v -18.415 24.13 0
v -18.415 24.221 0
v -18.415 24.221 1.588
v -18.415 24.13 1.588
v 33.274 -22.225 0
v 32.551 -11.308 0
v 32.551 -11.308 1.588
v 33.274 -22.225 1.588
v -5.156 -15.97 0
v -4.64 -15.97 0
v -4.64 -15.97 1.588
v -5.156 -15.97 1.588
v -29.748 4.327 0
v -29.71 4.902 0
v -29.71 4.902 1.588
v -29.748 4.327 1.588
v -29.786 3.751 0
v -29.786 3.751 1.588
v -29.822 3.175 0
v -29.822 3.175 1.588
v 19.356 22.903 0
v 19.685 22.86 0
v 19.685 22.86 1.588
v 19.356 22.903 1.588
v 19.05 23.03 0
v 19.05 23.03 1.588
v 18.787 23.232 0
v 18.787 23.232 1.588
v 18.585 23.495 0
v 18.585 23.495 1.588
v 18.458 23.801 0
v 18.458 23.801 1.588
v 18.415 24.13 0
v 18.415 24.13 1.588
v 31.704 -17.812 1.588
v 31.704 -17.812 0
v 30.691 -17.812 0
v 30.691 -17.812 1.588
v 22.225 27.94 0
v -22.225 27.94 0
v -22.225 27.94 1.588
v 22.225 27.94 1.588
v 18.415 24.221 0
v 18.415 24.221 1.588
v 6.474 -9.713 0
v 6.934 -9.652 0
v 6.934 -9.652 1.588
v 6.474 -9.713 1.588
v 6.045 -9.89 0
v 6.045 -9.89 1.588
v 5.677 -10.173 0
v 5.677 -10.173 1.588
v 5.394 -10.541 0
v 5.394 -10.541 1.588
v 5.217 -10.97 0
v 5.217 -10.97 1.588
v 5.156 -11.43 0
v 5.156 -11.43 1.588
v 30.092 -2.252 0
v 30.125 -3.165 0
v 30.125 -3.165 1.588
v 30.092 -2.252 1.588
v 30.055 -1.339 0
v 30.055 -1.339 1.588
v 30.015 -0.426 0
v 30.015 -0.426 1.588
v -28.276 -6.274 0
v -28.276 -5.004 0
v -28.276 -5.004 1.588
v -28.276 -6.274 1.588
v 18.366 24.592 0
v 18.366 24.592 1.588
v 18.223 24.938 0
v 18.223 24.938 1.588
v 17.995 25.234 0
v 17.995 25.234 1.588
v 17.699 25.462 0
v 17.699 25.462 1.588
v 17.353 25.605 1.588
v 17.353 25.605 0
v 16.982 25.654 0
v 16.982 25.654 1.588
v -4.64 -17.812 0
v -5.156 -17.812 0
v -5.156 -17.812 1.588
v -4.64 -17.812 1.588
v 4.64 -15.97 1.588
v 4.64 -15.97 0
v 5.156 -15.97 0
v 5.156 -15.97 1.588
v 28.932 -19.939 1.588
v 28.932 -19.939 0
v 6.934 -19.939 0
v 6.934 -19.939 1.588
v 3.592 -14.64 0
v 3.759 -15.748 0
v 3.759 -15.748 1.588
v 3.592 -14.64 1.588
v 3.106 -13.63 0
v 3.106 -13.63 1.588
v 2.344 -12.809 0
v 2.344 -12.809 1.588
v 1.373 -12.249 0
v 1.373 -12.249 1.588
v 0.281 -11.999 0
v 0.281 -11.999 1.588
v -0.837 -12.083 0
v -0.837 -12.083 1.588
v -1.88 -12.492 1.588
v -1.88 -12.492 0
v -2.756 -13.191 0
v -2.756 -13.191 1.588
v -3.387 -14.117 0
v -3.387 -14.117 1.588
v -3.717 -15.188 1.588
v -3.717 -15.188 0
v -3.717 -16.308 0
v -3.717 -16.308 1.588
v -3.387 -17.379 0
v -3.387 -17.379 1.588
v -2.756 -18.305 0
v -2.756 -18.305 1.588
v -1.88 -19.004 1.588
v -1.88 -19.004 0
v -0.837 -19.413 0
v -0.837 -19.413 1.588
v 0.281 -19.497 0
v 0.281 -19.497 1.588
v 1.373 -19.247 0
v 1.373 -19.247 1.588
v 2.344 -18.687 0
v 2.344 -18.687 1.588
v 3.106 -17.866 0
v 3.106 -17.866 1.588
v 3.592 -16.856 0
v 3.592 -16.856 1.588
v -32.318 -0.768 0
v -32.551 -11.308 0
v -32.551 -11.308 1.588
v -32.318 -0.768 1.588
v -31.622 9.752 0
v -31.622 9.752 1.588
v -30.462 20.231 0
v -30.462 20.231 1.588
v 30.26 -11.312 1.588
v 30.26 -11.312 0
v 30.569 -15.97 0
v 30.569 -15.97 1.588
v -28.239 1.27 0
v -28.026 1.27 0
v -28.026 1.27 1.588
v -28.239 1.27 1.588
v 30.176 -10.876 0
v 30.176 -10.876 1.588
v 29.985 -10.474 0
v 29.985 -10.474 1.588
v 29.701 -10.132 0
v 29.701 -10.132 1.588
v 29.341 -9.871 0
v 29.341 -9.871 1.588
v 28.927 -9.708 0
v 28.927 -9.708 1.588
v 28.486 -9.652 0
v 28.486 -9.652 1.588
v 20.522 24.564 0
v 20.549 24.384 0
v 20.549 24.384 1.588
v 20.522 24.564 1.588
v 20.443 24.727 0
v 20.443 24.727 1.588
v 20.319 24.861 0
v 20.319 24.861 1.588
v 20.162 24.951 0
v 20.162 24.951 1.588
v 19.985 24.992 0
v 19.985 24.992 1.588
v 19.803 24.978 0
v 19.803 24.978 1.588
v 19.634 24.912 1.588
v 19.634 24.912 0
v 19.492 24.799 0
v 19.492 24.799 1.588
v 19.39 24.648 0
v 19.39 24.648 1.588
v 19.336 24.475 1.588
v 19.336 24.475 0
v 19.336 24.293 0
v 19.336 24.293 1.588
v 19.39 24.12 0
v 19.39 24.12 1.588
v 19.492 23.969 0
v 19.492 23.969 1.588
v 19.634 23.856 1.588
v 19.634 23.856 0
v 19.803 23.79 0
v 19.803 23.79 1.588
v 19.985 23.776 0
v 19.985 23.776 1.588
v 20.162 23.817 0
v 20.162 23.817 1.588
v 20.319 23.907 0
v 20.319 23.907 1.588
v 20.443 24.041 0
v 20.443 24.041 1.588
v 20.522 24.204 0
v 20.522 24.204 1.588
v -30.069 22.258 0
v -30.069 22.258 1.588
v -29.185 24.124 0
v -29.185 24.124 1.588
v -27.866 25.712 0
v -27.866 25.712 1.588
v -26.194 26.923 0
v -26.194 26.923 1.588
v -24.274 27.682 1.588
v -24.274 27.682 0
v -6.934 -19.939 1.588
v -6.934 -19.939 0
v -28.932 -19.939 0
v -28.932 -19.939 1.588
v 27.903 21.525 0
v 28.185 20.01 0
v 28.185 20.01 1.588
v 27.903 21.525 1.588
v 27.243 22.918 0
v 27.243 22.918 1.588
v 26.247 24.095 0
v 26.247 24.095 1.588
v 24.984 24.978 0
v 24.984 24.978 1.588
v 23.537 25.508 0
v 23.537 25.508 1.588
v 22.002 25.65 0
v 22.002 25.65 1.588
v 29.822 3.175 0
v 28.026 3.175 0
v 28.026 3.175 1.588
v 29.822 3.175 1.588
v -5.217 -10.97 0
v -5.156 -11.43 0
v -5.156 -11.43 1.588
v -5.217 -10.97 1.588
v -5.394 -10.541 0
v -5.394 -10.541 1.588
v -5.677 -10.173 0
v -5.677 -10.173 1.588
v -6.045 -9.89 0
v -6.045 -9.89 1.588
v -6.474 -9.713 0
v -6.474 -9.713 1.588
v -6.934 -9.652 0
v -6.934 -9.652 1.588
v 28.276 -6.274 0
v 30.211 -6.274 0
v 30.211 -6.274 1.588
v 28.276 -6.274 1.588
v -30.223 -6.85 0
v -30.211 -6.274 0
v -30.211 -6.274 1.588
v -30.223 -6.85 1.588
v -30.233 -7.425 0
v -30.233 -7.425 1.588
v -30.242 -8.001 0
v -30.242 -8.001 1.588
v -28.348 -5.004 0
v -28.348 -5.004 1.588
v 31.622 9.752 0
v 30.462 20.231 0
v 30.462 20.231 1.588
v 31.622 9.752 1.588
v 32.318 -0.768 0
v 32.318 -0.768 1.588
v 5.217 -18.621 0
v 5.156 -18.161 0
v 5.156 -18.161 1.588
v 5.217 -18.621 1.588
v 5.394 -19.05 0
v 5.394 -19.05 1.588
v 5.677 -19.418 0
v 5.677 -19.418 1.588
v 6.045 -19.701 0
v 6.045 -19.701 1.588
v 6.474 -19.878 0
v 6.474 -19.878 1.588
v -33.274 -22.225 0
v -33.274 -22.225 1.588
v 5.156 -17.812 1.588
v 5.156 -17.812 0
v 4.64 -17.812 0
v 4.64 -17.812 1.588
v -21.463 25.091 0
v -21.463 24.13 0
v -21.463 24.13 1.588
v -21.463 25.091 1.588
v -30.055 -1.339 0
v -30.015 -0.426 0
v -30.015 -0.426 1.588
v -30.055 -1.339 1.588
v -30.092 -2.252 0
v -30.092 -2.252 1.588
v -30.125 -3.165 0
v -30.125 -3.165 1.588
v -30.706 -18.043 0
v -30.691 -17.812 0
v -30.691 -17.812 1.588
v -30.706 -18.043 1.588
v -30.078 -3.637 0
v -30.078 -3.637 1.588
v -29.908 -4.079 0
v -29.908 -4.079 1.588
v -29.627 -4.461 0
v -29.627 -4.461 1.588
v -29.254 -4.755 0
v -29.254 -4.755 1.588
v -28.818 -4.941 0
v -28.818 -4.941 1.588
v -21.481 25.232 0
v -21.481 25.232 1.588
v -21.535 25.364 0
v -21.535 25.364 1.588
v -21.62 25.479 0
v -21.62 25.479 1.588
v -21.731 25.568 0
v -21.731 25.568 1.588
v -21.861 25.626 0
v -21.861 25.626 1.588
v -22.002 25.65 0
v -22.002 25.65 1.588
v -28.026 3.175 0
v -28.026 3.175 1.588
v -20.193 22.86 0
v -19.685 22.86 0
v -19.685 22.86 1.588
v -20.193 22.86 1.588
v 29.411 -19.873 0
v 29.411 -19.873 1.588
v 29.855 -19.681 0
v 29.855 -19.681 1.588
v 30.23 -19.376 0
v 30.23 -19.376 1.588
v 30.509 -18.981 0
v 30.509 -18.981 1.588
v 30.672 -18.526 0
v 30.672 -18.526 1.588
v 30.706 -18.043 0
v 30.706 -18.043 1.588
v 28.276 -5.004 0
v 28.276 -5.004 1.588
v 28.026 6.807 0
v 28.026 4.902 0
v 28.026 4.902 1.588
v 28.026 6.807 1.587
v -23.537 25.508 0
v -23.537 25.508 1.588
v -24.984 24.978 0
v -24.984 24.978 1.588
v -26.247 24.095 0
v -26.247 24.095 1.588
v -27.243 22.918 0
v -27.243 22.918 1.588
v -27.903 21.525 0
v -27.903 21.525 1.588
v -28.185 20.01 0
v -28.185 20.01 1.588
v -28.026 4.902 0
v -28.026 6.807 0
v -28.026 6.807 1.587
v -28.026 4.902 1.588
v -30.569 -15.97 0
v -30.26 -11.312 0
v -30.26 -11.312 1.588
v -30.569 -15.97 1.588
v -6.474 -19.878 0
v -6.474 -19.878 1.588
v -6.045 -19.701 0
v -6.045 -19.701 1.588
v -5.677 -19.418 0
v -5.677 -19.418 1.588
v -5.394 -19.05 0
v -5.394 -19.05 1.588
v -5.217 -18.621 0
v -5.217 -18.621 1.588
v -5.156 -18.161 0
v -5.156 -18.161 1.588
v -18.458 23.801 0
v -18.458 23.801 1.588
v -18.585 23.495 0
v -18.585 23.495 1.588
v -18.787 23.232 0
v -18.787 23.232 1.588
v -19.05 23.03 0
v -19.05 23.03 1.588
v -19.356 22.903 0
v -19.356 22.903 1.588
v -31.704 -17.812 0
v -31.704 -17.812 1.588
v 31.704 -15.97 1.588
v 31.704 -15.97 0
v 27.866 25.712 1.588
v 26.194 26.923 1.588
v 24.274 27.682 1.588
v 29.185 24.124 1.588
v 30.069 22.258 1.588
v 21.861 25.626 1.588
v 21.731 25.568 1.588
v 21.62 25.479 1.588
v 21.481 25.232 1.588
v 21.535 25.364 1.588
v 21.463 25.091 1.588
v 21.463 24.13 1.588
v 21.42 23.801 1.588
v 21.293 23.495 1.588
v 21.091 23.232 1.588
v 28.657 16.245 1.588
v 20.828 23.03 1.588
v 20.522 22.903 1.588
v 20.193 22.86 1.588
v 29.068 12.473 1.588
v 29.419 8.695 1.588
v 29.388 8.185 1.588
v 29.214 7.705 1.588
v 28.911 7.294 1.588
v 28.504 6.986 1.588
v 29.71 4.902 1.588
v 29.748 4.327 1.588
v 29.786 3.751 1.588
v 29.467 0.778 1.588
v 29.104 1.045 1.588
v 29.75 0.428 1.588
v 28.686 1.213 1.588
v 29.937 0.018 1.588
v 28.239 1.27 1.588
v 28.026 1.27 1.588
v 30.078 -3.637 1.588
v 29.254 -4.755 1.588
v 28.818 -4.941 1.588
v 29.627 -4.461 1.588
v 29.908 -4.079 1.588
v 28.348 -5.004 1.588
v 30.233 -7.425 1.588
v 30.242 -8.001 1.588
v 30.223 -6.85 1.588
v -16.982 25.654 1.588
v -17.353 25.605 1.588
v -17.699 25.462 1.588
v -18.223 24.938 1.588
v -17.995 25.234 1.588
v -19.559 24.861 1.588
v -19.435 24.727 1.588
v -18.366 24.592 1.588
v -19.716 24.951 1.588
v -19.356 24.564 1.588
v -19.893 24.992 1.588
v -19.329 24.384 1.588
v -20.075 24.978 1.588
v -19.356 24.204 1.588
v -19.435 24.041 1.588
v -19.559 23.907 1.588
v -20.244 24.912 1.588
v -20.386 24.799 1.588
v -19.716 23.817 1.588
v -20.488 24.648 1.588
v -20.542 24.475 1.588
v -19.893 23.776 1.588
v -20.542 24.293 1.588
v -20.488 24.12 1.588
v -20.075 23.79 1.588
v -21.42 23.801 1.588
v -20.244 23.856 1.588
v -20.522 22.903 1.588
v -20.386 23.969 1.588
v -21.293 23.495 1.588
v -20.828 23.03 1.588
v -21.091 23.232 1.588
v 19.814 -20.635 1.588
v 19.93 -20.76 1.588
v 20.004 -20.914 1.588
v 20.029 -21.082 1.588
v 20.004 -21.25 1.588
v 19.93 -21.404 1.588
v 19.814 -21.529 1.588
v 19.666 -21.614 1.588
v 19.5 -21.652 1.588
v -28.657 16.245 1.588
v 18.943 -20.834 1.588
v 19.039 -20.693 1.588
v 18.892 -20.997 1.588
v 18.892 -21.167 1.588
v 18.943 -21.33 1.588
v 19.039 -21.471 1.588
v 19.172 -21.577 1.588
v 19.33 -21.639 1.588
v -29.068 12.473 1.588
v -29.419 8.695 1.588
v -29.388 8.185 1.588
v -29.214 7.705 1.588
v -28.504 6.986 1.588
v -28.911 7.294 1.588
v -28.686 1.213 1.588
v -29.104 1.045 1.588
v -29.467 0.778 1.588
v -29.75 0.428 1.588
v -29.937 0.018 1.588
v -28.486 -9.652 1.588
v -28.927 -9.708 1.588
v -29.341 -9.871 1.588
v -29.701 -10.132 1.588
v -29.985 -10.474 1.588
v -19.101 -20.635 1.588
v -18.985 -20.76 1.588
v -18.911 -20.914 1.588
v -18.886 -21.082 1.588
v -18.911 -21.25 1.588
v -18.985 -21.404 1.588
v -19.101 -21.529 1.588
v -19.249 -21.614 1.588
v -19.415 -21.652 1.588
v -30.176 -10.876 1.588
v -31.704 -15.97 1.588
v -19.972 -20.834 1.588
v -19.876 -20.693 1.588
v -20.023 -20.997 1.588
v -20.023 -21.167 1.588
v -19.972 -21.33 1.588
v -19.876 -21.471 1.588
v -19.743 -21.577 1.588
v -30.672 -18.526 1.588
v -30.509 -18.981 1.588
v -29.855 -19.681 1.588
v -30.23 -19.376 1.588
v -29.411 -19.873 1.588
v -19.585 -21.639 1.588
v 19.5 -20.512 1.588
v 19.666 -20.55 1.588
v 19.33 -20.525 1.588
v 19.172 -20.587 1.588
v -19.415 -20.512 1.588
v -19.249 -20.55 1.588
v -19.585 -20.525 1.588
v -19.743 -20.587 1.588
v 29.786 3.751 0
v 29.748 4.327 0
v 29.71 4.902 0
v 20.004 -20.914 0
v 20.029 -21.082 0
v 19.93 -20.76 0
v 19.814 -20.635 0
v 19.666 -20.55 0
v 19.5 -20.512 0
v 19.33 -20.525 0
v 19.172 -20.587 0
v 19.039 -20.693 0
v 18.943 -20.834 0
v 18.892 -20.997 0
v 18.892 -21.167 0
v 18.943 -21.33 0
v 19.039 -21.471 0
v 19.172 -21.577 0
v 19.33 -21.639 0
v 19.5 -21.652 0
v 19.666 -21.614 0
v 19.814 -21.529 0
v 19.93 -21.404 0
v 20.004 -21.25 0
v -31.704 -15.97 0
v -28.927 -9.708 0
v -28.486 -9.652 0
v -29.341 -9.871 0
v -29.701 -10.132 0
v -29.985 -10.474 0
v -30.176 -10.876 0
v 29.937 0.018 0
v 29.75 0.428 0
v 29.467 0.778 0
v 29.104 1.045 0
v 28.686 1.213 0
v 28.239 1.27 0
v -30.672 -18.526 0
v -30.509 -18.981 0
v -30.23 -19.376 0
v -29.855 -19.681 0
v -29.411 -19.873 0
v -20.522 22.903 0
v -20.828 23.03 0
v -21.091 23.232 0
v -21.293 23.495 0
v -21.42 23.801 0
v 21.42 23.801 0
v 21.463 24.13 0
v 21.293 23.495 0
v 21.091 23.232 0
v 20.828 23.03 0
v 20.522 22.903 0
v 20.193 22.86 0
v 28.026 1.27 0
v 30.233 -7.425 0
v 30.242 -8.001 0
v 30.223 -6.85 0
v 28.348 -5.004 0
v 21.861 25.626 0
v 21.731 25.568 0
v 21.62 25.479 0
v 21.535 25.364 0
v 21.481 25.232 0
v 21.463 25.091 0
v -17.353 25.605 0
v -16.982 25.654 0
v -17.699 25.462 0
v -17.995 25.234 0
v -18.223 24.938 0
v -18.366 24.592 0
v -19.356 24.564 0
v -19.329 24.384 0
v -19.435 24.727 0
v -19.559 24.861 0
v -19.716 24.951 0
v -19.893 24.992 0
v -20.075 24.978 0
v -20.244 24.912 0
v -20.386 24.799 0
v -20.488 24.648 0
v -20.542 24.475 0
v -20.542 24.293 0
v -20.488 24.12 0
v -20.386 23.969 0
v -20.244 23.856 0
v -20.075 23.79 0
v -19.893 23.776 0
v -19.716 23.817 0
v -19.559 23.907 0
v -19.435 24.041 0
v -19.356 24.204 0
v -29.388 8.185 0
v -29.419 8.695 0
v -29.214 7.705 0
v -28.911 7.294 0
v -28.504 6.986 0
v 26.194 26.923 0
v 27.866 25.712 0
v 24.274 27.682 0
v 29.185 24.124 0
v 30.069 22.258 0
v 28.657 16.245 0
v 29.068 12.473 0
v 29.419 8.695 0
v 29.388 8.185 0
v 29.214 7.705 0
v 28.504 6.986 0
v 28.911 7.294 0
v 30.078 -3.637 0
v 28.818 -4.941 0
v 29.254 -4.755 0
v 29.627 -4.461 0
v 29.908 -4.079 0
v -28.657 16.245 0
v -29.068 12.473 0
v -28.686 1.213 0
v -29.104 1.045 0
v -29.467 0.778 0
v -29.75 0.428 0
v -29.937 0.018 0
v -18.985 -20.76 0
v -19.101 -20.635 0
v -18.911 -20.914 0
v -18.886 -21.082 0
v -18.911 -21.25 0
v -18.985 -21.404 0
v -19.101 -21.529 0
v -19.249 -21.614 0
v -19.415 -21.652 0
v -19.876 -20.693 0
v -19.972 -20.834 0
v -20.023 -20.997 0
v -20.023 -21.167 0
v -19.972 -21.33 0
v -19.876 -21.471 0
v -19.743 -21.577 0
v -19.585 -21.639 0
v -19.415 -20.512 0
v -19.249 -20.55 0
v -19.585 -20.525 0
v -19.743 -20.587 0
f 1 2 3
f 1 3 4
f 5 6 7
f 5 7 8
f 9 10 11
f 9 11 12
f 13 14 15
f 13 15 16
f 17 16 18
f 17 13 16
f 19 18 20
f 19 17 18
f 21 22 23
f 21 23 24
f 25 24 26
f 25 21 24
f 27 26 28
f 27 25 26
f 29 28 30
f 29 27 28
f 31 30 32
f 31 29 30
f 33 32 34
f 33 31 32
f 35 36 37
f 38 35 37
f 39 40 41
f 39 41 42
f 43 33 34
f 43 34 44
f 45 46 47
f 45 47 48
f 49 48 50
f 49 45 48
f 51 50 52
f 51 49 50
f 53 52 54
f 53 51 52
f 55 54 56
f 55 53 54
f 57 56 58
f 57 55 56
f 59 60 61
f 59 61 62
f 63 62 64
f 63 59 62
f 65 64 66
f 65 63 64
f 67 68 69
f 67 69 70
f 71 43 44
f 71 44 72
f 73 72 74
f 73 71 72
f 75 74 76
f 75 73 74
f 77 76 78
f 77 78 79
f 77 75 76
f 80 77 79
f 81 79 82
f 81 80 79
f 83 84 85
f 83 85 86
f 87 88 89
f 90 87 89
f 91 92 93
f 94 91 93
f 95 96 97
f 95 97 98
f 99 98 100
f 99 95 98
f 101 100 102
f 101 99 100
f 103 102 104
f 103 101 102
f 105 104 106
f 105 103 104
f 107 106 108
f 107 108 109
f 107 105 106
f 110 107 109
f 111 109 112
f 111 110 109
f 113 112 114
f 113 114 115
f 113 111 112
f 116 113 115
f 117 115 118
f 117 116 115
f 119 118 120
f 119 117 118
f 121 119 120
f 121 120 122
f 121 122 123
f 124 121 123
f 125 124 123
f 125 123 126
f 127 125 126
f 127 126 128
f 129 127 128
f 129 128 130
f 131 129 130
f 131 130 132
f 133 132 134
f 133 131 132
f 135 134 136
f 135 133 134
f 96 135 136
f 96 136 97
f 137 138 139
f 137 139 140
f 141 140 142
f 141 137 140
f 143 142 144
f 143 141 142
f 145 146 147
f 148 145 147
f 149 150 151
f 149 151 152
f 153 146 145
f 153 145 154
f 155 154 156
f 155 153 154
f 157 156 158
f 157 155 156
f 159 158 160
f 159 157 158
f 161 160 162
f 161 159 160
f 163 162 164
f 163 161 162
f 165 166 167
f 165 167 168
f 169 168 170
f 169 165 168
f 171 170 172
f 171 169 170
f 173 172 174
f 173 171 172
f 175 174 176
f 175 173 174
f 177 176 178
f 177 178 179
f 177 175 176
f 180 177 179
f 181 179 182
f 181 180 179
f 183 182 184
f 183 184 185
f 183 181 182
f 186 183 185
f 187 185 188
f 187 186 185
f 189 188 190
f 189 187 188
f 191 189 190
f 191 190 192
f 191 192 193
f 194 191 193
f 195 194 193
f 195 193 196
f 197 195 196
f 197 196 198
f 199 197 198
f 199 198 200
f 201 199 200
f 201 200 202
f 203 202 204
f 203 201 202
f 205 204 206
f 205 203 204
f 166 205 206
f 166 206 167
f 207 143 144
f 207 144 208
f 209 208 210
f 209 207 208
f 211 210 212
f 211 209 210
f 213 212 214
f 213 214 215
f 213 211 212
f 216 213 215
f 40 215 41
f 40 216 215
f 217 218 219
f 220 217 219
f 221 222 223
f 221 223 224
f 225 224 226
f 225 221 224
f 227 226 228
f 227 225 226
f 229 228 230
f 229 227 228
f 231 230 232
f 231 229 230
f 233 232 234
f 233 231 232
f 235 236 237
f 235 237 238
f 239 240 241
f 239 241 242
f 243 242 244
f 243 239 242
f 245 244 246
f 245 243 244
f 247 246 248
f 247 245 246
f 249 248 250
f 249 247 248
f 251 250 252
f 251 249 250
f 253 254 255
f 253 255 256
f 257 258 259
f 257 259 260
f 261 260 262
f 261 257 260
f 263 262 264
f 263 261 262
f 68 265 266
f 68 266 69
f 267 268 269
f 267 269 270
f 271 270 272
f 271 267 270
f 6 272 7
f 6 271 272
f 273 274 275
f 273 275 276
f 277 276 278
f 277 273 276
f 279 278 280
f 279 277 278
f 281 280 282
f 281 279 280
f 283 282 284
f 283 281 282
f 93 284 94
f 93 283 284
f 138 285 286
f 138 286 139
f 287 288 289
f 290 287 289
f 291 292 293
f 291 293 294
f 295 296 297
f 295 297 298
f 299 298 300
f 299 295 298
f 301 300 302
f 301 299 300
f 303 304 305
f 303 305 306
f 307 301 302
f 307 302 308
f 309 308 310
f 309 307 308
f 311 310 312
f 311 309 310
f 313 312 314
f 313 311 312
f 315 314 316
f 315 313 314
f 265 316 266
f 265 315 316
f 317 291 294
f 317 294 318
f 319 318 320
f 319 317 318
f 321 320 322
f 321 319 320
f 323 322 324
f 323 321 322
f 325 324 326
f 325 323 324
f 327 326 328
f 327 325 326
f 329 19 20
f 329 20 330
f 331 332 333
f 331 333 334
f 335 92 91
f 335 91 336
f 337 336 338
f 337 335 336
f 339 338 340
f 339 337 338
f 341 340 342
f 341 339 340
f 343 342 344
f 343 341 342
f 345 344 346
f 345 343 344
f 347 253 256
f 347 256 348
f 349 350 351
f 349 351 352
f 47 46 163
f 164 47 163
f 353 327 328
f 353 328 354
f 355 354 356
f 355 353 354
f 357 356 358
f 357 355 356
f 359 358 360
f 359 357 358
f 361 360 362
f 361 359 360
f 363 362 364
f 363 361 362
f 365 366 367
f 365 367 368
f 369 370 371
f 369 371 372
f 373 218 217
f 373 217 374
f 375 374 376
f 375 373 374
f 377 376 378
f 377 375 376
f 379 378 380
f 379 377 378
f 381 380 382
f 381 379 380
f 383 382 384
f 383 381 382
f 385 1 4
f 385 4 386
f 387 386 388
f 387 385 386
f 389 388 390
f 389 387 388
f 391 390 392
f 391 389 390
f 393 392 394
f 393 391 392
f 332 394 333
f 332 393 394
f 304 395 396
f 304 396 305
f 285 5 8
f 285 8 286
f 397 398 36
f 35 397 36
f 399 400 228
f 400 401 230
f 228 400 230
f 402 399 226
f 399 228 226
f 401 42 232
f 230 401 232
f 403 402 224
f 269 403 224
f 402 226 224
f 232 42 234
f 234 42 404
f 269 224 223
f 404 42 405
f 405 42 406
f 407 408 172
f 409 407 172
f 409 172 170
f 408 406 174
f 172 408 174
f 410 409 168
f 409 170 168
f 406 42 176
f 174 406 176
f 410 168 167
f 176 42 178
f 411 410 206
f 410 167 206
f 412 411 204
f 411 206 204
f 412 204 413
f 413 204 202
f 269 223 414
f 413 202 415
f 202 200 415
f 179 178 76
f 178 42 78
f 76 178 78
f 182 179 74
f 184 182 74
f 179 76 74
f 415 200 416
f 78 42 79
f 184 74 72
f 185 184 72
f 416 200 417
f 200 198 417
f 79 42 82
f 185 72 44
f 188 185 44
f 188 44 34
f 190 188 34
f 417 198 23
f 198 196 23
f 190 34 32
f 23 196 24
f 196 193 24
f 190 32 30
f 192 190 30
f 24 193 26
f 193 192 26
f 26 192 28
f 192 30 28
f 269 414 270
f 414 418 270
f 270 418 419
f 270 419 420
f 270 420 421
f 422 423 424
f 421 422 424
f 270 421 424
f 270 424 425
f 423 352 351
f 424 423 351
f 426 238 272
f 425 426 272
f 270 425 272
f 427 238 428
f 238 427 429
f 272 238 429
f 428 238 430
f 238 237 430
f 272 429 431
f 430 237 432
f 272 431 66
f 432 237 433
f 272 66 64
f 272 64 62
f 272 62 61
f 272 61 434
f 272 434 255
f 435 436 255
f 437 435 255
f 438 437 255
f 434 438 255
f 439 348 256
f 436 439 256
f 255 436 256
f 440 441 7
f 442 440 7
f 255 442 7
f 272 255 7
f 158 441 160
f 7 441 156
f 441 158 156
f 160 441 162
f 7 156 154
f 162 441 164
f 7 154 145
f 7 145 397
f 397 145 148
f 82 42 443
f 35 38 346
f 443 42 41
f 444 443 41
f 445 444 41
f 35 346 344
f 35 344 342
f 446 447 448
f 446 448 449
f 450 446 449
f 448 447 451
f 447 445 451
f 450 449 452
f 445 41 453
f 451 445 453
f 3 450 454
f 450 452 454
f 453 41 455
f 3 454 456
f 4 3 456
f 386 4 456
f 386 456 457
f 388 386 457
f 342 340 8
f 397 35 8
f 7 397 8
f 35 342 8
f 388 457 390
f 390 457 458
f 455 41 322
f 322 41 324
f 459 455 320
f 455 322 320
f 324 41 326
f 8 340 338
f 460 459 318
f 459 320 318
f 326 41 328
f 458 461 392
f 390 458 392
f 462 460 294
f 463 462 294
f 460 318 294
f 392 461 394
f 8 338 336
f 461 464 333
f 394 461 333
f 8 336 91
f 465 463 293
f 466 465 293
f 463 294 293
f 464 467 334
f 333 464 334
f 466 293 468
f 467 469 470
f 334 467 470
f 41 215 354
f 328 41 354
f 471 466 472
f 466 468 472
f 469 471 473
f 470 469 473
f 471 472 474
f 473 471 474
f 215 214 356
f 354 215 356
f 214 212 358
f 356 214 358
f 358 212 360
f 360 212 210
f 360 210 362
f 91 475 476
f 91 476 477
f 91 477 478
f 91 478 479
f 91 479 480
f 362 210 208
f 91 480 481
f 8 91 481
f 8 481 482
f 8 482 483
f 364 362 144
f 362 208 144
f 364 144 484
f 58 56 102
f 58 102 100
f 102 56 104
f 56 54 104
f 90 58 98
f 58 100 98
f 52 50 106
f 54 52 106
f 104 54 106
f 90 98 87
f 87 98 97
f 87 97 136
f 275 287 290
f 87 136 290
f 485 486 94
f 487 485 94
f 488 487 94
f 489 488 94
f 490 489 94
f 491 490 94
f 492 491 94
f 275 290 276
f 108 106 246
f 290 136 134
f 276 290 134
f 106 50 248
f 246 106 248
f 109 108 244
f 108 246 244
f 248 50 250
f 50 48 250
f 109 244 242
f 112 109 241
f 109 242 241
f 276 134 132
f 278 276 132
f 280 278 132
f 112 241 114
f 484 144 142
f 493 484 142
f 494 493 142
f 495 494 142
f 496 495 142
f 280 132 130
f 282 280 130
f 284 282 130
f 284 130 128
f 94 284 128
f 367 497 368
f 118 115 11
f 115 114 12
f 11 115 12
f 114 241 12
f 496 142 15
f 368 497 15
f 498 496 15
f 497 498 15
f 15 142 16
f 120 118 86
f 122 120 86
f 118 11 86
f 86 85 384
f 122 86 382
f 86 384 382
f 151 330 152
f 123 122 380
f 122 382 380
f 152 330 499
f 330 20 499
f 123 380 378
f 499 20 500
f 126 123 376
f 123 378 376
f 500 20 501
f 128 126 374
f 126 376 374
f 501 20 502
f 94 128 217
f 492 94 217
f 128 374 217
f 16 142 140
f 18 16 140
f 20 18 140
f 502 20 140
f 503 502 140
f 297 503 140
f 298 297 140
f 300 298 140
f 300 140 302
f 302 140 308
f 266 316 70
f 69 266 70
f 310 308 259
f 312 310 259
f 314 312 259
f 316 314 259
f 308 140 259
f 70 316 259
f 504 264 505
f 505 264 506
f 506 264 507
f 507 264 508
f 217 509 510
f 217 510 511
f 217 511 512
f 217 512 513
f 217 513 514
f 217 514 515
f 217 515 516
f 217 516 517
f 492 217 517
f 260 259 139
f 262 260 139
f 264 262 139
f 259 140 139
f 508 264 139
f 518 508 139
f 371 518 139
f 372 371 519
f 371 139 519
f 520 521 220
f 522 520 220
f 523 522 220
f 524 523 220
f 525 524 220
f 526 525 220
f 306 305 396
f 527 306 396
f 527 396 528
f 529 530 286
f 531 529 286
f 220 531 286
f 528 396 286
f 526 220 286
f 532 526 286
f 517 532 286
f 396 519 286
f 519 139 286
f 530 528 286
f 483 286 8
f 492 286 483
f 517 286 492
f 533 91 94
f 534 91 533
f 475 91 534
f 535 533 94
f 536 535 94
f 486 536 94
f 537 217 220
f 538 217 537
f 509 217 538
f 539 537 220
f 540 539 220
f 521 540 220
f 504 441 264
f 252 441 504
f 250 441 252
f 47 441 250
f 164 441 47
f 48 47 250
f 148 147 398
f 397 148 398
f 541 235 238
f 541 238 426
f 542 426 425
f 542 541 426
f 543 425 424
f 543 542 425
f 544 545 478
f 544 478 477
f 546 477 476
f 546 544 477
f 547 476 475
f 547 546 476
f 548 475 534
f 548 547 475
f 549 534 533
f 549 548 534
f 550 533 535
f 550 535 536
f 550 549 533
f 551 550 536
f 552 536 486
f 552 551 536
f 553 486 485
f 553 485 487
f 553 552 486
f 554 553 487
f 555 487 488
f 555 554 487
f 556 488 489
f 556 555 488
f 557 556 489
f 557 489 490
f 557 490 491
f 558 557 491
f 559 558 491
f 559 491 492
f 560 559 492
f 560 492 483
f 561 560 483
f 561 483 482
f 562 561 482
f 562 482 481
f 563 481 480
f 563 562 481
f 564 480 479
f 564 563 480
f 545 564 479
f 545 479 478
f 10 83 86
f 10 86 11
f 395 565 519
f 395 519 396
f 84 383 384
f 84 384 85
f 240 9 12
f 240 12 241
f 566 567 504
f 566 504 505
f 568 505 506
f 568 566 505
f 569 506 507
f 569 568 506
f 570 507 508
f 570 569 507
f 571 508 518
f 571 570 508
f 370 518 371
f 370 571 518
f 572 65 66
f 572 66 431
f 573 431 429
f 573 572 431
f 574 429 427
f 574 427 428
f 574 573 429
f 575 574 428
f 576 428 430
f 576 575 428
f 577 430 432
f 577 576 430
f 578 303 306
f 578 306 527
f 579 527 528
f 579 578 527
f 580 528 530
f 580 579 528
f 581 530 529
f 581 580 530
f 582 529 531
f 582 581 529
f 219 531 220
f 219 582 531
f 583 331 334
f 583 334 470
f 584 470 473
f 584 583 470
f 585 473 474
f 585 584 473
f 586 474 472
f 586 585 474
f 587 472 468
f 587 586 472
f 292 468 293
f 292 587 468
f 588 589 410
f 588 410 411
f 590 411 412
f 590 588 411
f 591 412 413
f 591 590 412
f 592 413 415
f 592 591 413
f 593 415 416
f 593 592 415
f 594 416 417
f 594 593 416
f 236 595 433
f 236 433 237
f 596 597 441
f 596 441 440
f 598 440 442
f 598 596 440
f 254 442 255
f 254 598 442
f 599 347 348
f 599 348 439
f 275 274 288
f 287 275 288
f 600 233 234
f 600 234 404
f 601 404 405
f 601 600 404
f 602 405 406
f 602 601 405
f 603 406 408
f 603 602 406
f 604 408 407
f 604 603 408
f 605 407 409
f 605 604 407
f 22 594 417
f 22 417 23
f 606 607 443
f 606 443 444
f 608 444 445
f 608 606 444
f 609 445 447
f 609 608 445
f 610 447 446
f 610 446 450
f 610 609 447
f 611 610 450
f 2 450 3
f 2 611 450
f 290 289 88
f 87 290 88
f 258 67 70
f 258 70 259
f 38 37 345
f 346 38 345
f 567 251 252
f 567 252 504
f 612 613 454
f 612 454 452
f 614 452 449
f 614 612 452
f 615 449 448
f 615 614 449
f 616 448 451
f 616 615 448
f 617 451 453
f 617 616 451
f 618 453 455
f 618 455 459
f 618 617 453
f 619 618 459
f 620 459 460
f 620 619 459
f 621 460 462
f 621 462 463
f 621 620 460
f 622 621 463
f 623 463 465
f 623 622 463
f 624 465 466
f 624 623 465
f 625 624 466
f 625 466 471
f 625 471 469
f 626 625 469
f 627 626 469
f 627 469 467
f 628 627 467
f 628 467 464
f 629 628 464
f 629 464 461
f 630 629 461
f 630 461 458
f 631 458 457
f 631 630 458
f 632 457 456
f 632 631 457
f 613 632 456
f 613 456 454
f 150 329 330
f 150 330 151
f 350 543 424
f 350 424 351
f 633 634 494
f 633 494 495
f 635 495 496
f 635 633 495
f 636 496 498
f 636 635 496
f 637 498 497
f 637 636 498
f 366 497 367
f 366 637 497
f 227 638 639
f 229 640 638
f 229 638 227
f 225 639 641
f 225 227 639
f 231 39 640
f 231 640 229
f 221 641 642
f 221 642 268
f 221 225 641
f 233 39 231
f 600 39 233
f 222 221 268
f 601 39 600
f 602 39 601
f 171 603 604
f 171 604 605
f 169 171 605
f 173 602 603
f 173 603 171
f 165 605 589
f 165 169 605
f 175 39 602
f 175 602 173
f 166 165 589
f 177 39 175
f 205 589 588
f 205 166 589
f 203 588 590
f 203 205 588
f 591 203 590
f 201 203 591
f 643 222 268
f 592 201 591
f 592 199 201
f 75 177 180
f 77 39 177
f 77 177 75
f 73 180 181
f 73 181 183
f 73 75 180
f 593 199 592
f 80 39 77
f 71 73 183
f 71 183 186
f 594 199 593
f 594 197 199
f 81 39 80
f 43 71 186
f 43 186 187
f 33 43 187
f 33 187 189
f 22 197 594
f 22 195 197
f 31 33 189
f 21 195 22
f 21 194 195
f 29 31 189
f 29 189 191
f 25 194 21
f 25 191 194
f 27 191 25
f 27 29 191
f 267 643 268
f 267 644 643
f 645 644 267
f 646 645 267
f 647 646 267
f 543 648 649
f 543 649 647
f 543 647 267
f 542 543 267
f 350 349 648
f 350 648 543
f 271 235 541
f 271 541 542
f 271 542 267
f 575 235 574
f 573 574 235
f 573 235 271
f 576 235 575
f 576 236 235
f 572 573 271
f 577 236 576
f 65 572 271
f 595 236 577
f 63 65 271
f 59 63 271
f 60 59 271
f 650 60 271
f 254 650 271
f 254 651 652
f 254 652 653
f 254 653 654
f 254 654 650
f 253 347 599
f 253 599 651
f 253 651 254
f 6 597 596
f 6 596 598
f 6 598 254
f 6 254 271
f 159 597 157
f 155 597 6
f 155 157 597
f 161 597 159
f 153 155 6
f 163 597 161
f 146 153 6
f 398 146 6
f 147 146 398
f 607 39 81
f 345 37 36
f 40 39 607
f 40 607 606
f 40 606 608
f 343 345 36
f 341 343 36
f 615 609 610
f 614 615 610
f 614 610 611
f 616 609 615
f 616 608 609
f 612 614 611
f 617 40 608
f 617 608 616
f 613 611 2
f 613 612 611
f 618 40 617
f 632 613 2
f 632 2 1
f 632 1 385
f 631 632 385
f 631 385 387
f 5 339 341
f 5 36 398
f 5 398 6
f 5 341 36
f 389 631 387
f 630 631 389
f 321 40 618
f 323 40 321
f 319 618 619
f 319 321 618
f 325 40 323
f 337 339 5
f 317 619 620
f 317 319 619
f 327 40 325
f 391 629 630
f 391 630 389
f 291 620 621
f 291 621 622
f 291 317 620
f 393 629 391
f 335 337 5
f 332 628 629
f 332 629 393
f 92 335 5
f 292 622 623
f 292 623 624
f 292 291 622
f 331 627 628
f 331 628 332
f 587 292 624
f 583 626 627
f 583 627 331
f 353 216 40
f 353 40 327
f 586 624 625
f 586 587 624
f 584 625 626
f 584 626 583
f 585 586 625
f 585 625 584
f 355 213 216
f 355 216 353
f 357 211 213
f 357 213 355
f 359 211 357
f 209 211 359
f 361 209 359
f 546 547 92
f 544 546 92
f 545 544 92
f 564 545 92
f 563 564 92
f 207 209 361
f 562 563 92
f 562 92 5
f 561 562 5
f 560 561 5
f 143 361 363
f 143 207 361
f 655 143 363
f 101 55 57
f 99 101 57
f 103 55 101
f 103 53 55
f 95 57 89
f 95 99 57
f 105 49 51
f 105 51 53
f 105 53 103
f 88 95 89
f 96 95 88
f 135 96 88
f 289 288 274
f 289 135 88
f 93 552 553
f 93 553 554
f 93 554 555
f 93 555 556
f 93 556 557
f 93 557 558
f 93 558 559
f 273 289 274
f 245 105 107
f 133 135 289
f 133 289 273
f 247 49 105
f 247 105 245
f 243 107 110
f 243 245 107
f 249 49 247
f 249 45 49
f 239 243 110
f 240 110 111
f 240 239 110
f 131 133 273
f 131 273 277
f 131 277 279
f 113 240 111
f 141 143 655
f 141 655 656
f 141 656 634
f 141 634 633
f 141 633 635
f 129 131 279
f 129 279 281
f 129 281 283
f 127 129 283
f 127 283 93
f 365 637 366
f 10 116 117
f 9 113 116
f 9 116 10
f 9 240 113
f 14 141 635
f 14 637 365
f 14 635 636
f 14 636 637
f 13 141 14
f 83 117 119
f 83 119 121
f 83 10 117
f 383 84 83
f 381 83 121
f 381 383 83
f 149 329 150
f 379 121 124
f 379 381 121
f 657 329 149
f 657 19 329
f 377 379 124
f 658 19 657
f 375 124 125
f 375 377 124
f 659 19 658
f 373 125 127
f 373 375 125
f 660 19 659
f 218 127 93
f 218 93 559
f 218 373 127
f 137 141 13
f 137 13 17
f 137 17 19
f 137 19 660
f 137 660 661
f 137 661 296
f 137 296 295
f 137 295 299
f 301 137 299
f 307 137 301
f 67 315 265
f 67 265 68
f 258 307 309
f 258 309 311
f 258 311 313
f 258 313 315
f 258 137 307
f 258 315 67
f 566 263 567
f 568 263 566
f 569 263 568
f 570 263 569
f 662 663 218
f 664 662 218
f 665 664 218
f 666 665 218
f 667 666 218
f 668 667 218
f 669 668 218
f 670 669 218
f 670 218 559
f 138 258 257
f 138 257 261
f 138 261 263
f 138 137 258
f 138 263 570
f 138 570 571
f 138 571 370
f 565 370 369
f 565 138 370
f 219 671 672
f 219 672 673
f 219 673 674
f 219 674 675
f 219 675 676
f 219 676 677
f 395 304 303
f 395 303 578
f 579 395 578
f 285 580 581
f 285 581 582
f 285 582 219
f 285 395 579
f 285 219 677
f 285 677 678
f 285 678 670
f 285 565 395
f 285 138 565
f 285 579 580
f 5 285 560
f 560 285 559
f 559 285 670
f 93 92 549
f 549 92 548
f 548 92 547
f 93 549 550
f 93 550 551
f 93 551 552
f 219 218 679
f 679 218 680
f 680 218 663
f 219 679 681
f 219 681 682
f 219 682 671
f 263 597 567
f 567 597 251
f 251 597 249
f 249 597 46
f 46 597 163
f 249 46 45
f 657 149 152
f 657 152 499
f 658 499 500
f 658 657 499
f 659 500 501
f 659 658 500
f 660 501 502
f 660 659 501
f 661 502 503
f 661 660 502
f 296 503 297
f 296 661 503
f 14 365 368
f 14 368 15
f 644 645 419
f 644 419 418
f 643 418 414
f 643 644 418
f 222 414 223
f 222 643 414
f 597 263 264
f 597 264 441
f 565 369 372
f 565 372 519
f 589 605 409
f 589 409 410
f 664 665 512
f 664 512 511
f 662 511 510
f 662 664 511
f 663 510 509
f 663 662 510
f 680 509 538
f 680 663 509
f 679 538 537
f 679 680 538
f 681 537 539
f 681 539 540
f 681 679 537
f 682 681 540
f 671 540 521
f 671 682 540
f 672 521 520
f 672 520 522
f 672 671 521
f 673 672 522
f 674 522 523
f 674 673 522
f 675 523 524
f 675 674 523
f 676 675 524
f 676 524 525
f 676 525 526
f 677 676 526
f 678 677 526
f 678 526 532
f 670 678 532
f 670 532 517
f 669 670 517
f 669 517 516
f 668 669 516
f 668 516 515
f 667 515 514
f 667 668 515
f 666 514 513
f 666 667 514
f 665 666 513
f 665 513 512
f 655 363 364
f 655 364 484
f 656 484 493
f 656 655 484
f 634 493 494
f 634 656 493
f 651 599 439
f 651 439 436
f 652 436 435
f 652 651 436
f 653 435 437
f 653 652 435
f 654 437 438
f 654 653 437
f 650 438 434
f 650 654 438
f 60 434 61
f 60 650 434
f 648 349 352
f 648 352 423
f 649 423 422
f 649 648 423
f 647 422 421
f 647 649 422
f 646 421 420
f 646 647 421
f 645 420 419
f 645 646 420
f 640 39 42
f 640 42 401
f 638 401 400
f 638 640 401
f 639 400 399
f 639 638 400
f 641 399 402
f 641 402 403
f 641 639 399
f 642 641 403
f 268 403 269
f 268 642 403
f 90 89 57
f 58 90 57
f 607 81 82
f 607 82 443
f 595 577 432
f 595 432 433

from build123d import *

# Parameters (mm, degrees)
SKETCH1_R           = 3.7592
SKETCH1_R_2         = 0.5715
SKETCH1_R_3         = 0.6096
BOSS_EXTRUDE1_DEPTH = 1.5875
FILLET1_R           = 1.778


with BuildPart() as part:
    # Sketch1 → Boss-Extrude1 (new body)
    with BuildSketch(Plane.XY):
        with BuildLine():
            Line((32.550881113, -11.307538914), (33.274, -22.225))
            Line((33.274, -22.225), (-33.274, -22.225))
            Line((-33.274, -22.225), (-32.550881113, -11.307538914))
            ThreePointArc((-32.550881113, -11.307538914), (-32.028077235, 4.496070358), (-30.461951667, 20.230575137))
            ThreePointArc((-30.461951667, 20.230575137), (-27.865979624, 25.711970539), (-22.225, 27.94))
            Line((-22.225, 27.94), (22.225, 27.94))
            ThreePointArc((22.225, 27.94), (27.865979624, 25.711970539), (30.461951667, 20.230575137))
            ThreePointArc((30.461951667, 20.230575137), (32.028077235, 4.496070358), (32.550881113, -11.307538914))
        make_face()
        with Locations((0, -15.748)):
            Circle(SKETCH1_R, mode=Mode.SUBTRACT)
        with Locations((19.457528855, -21.082)):
            Circle(SKETCH1_R_2, mode=Mode.SUBTRACT)
        with Locations((-19.939, 24.384)):
            Circle(SKETCH1_R_3, mode=Mode.SUBTRACT)
        with Locations((19.939, 24.384)):
            Circle(SKETCH1_R_3, mode=Mode.SUBTRACT)
        with Locations((-19.457528855, -21.082)):
            Circle(SKETCH1_R_2, mode=Mode.SUBTRACT)
        with BuildLine():
            Line((16.982329273, 25.654), (-16.982329273, 25.654))
            ThreePointArc((-16.982329273, 25.654), (-17.995380459, 25.234380459), (-18.415, 24.221329273))
            Line((-18.415, 24.221329273), (-18.415, 24.13))
            ThreePointArc((-18.415, 24.13), (-18.786974388, 23.231974388), (-19.685, 22.86))
            Line((-19.685, 22.86), (-20.193, 22.86))
            ThreePointArc((-20.193, 22.86), (-21.091025612, 23.231974388), (-21.463, 24.13))
            Line((-21.463, 24.13), (-21.463, 25.09062388))
            ThreePointArc((-21.463, 25.09062388), (-21.619564426, 25.478838601), (-22.001648865, 25.649819802))
            ThreePointArc((-22.001648865, 25.649819802), (-26.24741448, 24.095118224), (-28.185149732, 20.00992487))
            ThreePointArc((-28.185149732, 20.00992487), (-28.97064802, 13.418275107), (-29.571097928, 6.8072))
            Line((-29.571097928, 6.8072), (-28.02566998, 6.8072))
            Line((-28.02566998, 6.8072), (-28.02566998, 4.9022))
            Line((-28.02566998, 4.9022), (-29.709508346, 4.9022))
            ThreePointArc((-29.709508346, 4.9022), (-29.767162744, 4.038702455), (-29.821661459, 3.175))
            Line((-29.821661459, 3.175), (-28.02566998, 3.175))
            Line((-28.02566998, 3.175), (-28.02566998, 1.27))
            Line((-28.02566998, 1.27), (-29.93066998, 1.27))
            ThreePointArc((-29.93066998, 1.27), (-30.076613863, -1.86607048), (-30.180974457, -5.0038))
            Line((-30.180974457, -5.0038), (-28.275974457, -5.0038))
            Line((-28.275974457, -5.0038), (-28.275974457, -6.2738))
            Line((-28.275974457, -6.2738), (-30.211381152, -6.2738))
            ThreePointArc((-30.211381152, -6.2738), (-30.228164423, -7.137372267), (-30.241798154, -8.001))
            Line((-30.241798154, -8.001), (30.241798154, -8.001))
            ThreePointArc((30.241798154, -8.001), (30.228164423, -7.137372267), (30.211381152, -6.2738))
            Line((30.211381152, -6.2738), (28.275974457, -6.2738))
            Line((28.275974457, -6.2738), (28.275974457, -5.0038))
            Line((28.275974457, -5.0038), (30.180974457, -5.0038))
            ThreePointArc((30.180974457, -5.0038), (30.076613863, -1.86607048), (29.93066998, 1.27))
            Line((29.93066998, 1.27), (28.02566998, 1.27))
            Line((28.02566998, 1.27), (28.02566998, 3.175))
            Line((28.02566998, 3.175), (29.821661459, 3.175))
            ThreePointArc((29.821661459, 3.175), (29.767162744, 4.038702455), (29.709508346, 4.9022))
            Line((29.709508346, 4.9022), (28.02566998, 4.9022))
            Line((28.02566998, 4.9022), (28.02566998, 6.8072))
            Line((28.02566998, 6.8072), (29.571097928, 6.8072))
            ThreePointArc((29.571097928, 6.8072), (28.97064802, 13.418275107), (28.185149732, 20.00992487))
            ThreePointArc((28.185149732, 20.00992487), (26.24741448, 24.095118224), (22.001648865, 25.649819802))
            ThreePointArc((22.001648865, 25.649819802), (21.619564426, 25.478838601), (21.463, 25.09062388))
            Line((21.463, 25.09062388), (21.463, 24.13))
            ThreePointArc((21.463, 24.13), (21.091025612, 23.231974388), (20.193, 22.86))
            Line((20.193, 22.86), (19.685, 22.86))
            ThreePointArc((19.685, 22.86), (18.786974388, 23.231974388), (18.415, 24.13))
            Line((18.415, 24.13), (18.415, 24.221329273))
            ThreePointArc((18.415, 24.221329273), (17.995380459, 25.234380459), (16.982329273, 25.654))
        make_face(mode=Mode.SUBTRACT)
        Polygon((30.150217413, -9.652), (30.568707194, -15.97025), (30.330164629, -15.97025), (31.704083289, -15.97025), (31.704083289, -17.81175), (30.690679091, -17.81175), (30.83157766, -19.939), (19.965528855, -19.939), (18.949528855, -19.939), (5.1562, -19.939), (5.1562, -17.81175), (4.640078489, -17.81175), (4.640078489, -15.97025), (5.1562, -15.97025), (5.1562, -9.652), align=None, mode=Mode.SUBTRACT)
        Polygon((-30.83157766, -19.939), (-19.965528855, -19.939), (-18.949528855, -19.939), (-5.1562, -19.939), (-5.1562, -17.81175), (-4.640078489, -17.81175), (-4.640078489, -15.97025), (-5.1562, -15.97025), (-5.1562, -9.652), (-30.150217413, -9.652), (-30.568707194, -15.97025), (-31.704083289, -15.97025), (-31.704083289, -17.81175), (-30.690679091, -17.81175), align=None, mode=Mode.SUBTRACT)
    extrude(amount=BOSS_EXTRUDE1_DEPTH)

    # Fillet1
    # the kernel refuses this fillet: 1.778 mm, written as the material it adds along each edge
    with BuildSketch(Plane(origin=(-30.180974457, -5.0038, 0), x_dir=(1, 0, 0), z_dir=(0, 0, 1))) as fillet1_piece_1:
        with BuildLine():
            CenterArc((1.833067409, 1.778), FILLET1_R, 178.029670908, 91.970329092)
            Line((0.056118624, 1.839131111), (0.020579648, 1.840353734))
            ThreePointArc((0.020579648, 1.840353734), (-0.009270189, 0.920704615), (-0.035547402, 0.000946483))
            Line((-0.035547402, 0.000946483), (0, -0.03556))
            Line((0, -0.03556), (1.833067409, -0.03556))
            Line((1.833067409, -0.03556), (1.833067409, 0))
        make_face()
    extrude(amount=1.5875)
    with BuildSketch(Plane(origin=(-29.93066998, 1.27, 0), x_dir=(-0.04952574354141493, -0.9987728474115973, 0), z_dir=(0, 0, 1))) as fillet1_piece_2:
        with BuildLine():
            CenterArc((1.692020161, 1.777988571), FILLET1_R, 182.838777382, 87.366662802)
            Line((-0.083797962, 1.689931798), (-0.119314324, 1.688170663))
            Line((-0.119314324, 1.688170663), (-0.035516362, -0.001761135))
            Line((-0.035516362, -0.001761135), (-0.000127504, -0.035559771))
            ThreePointArc((-0.000127504, -0.035559771), (0.849197679, -0.037082446), (1.698522862, -0.035559771))
            Line((1.698522862, -0.035559771), (1.698395358, 0))
        make_face()
    extrude(amount=1.5875)
    with BuildSketch(Plane(origin=(-29.571097928, 6.8072, 0), x_dir=(1, 0, 0), z_dir=(0, 0, 1))) as fillet1_piece_3:
        with BuildLine():
            CenterArc((1.924023206, 1.737224692), FILLET1_R, 175.155271265, 82.550426931)
            Line((0.152375588, 1.887387004), (0.116942636, 1.89039025))
            ThreePointArc((0.116942636, 1.89039025), (0.038856877, 0.946707362), (-0.035455831, 0.002719862))
            Line((-0.035455831, 0.002719862), (0, -0.03556))
            ThreePointArc((0, -0.03556), (0.772713974, -0.03556), (1.537856043, -0.034744494))
            Line((1.537856043, -0.034744494), (1.545427948, 0))
        make_face()
    extrude(amount=1.5875)
    with BuildSketch(Plane(origin=(29.93066998, 1.27, 0), x_dir=(0.04952574354144595, -0.9987728474115959, 0), z_dir=(0, 0, 1))) as fillet1_piece_4:
        with BuildLine():
            CenterArc((1.692020161, -1.777988571), FILLET1_R, 89.794559817, 87.366662802)
            Line((-0.083797962, -1.689931798), (-0.119314324, -1.688170663))
            Line((-0.119314324, -1.688170663), (-0.035516362, 0.001761135))
            Line((-0.035516362, 0.001761135), (-0.000127504, 0.035559771))
            ThreePointArc((-0.000127504, 0.035559771), (0.849197679, 0.037082446), (1.698522862, 0.035559771))
            Line((1.698522862, 0.035559771), (1.698395358, 0))
        make_face()
    extrude(amount=1.5875)
    with BuildSketch(Plane(origin=(29.571097928, 6.8072, 0), x_dir=(-0.08047179326546709, 0.9967568863512506, 0), z_dir=(0, 0, 1))) as fillet1_piece_5:
        with BuildLine():
            CenterArc((1.886420273, 1.777985793), FILLET1_R, 187.678616869, 82.550426931)
            Line((0.124363358, 1.540415949), (0.08912222, 1.535664552))
            ThreePointArc((0.08912222, 1.535664552), (0.026737004, 0.773069552), (-0.035444675, 0.002861577))
            Line((-0.035444675, 0.002861577), (-0.000142153, -0.035559716))
            ThreePointArc((-0.000142153, -0.035559716), (0.946763965, -0.037452379), (1.893670084, -0.035559716))
            Line((1.893670084, -0.035559716), (1.89352793, 0))
        make_face()
    extrude(amount=1.5875)
    with BuildSketch(Plane(origin=(30.180974457, -5.0038, 0), x_dir=(-0.03049946566100157, 0.9995347830838072, 0), z_dir=(0, 0, 1))) as fillet1_piece_6:
        with BuildLine():
            CenterArc((1.833080421, 1.777986585), FILLET1_R, 178.252238302, 91.970329092)
            Line((0.055907577, 1.832214635), (0.02036412, 1.833299196))
            Line((0.02036412, 1.833299196), (-0.035543457, 0.001084561))
            Line((-0.035543457, 0.001084561), (-0.000138134, -0.035559732))
            ThreePointArc((-0.000138134, -0.035559732), (0.919993552, -0.037346875), (1.840125238, -0.035559732))
            Line((1.840125238, -0.035559732), (1.839987105, 0))
        make_face()
    extrude(amount=1.5875)
    with BuildSketch(Plane(origin=(-30.150217413, -9.652, 0), x_dir=(-0.06609026487531962, -0.9978136483776467, 0), z_dir=(0, 0, 1))) as fillet1_piece_7:
        with BuildLine():
            CenterArc((FILLET1_R * 0.935956064184, FILLET1_R), FILLET1_R, 183.789455341, 86.210544659)
            Line((-FILLET1_R * 0.0618575841936, FILLET1_R * 0.933909735125), (-FILLET1_R * 0.0818138571611, FILLET1_R * 0.932587929827))
            Line((-FILLET1_R * 0.0818138571611, FILLET1_R * 0.932587929827), (-FILLET1_R * 0.0187191212837, -FILLET1_R * 0.02))
            Line((-FILLET1_R * 0.0187191212837, -FILLET1_R * 0.02), (FILLET1_R * 0.935956064184, -FILLET1_R * 0.02))
            Line((FILLET1_R * 0.935956064184, -FILLET1_R * 0.02), (FILLET1_R * 0.935956064184, 0))
        make_face()
    extrude(amount=1.5875)
    with BuildSketch(Plane(origin=(-5.1562, -9.652, 0), x_dir=(-1, 0, 0), z_dir=(0, 0, 1)), Plane(origin=(5.1562, -9.652, 0), x_dir=(0, -1, 0), z_dir=(0, 0, 1)), Plane(origin=(-5.1562, -19.939, 0), x_dir=(0, 1, 0), z_dir=(0, 0, 1)), Plane(origin=(5.1562, -19.939, 0), x_dir=(1, 0, 0), z_dir=(0, 0, 1))) as fillet1_piece_8:
        with BuildLine():
            CenterArc((FILLET1_R, FILLET1_R), FILLET1_R, 180, 90)
            Line((0, FILLET1_R), (-FILLET1_R * 0.02, FILLET1_R))
            Line((-FILLET1_R * 0.02, FILLET1_R), (-FILLET1_R * 0.02, -FILLET1_R * 0.02))
            Line((-FILLET1_R * 0.02, -FILLET1_R * 0.02), (FILLET1_R, -FILLET1_R * 0.02))
            Line((FILLET1_R, -FILLET1_R * 0.02), (FILLET1_R, 0))
        make_face()
    extrude(amount=1.5875)
    with BuildSketch(Plane(origin=(30.150217413, -9.652, 0), x_dir=(0.06609026487531962, -0.9978136483776467, 0), z_dir=(0, 0, 1))) as fillet1_piece_9:
        with BuildLine():
            CenterArc((FILLET1_R * 0.935956064184, -FILLET1_R), FILLET1_R, 90, 86.210544659)
            Line((-FILLET1_R * 0.0618575841936, -FILLET1_R * 0.933909735125), (-FILLET1_R * 0.0818138571611, -FILLET1_R * 0.932587929827))
            Line((-FILLET1_R * 0.0818138571611, -FILLET1_R * 0.932587929827), (-FILLET1_R * 0.0187191212837, FILLET1_R * 0.02))
            Line((-FILLET1_R * 0.0187191212837, FILLET1_R * 0.02), (FILLET1_R * 0.935956064184, FILLET1_R * 0.02))
            Line((FILLET1_R * 0.935956064184, FILLET1_R * 0.02), (FILLET1_R * 0.935956064184, 0))
        make_face()
    extrude(amount=1.5875)
    with BuildSketch(Plane(origin=(-30.83157766, -19.939, 0), x_dir=(0.06609026487531591, 0.9978136483776471, 0), z_dir=(0, 0, 1))) as fillet1_piece_10:
        with BuildLine():
            CenterArc((FILLET1_R * 1.06842622028, -FILLET1_R), FILLET1_R, 90, 93.789455341)
            Line((FILLET1_R * 0.0706125718977, -FILLET1_R * 1.06609026488), (FILLET1_R * 0.0506562989302, -FILLET1_R * 1.06741207017))
            Line((FILLET1_R * 0.0506562989302, -FILLET1_R * 1.06741207017), (-FILLET1_R * 0.0213685244055, FILLET1_R * 0.02))
            Line((-FILLET1_R * 0.0213685244055, FILLET1_R * 0.02), (FILLET1_R * 1.06842622028, FILLET1_R * 0.02))
            Line((FILLET1_R * 1.06842622028, FILLET1_R * 0.02), (FILLET1_R * 1.06842622028, 0))
        make_face()
    extrude(amount=1.5875)
    with BuildSketch(Plane(origin=(30.83157766, -19.939, 0), x_dir=(-0.06609026487531046, 0.9978136483776474, 0), z_dir=(0, 0, 1))) as fillet1_piece_11:
        with BuildLine():
            CenterArc((FILLET1_R * 1.06842622028, FILLET1_R), FILLET1_R, 176.210544659, 93.789455341)
            Line((FILLET1_R * 0.0706125718977, FILLET1_R * 1.06609026488), (FILLET1_R * 0.0506562989302, FILLET1_R * 1.06741207017))
            Line((FILLET1_R * 0.0506562989302, FILLET1_R * 1.06741207017), (-FILLET1_R * 0.0213685244055, -FILLET1_R * 0.02))
            Line((-FILLET1_R * 0.0213685244055, -FILLET1_R * 0.02), (FILLET1_R * 1.06842622028, -FILLET1_R * 0.02))
            Line((FILLET1_R * 1.06842622028, -FILLET1_R * 0.02), (FILLET1_R * 1.06842622028, 0))
        make_face()
    extrude(amount=1.5875)


solid = part.part
